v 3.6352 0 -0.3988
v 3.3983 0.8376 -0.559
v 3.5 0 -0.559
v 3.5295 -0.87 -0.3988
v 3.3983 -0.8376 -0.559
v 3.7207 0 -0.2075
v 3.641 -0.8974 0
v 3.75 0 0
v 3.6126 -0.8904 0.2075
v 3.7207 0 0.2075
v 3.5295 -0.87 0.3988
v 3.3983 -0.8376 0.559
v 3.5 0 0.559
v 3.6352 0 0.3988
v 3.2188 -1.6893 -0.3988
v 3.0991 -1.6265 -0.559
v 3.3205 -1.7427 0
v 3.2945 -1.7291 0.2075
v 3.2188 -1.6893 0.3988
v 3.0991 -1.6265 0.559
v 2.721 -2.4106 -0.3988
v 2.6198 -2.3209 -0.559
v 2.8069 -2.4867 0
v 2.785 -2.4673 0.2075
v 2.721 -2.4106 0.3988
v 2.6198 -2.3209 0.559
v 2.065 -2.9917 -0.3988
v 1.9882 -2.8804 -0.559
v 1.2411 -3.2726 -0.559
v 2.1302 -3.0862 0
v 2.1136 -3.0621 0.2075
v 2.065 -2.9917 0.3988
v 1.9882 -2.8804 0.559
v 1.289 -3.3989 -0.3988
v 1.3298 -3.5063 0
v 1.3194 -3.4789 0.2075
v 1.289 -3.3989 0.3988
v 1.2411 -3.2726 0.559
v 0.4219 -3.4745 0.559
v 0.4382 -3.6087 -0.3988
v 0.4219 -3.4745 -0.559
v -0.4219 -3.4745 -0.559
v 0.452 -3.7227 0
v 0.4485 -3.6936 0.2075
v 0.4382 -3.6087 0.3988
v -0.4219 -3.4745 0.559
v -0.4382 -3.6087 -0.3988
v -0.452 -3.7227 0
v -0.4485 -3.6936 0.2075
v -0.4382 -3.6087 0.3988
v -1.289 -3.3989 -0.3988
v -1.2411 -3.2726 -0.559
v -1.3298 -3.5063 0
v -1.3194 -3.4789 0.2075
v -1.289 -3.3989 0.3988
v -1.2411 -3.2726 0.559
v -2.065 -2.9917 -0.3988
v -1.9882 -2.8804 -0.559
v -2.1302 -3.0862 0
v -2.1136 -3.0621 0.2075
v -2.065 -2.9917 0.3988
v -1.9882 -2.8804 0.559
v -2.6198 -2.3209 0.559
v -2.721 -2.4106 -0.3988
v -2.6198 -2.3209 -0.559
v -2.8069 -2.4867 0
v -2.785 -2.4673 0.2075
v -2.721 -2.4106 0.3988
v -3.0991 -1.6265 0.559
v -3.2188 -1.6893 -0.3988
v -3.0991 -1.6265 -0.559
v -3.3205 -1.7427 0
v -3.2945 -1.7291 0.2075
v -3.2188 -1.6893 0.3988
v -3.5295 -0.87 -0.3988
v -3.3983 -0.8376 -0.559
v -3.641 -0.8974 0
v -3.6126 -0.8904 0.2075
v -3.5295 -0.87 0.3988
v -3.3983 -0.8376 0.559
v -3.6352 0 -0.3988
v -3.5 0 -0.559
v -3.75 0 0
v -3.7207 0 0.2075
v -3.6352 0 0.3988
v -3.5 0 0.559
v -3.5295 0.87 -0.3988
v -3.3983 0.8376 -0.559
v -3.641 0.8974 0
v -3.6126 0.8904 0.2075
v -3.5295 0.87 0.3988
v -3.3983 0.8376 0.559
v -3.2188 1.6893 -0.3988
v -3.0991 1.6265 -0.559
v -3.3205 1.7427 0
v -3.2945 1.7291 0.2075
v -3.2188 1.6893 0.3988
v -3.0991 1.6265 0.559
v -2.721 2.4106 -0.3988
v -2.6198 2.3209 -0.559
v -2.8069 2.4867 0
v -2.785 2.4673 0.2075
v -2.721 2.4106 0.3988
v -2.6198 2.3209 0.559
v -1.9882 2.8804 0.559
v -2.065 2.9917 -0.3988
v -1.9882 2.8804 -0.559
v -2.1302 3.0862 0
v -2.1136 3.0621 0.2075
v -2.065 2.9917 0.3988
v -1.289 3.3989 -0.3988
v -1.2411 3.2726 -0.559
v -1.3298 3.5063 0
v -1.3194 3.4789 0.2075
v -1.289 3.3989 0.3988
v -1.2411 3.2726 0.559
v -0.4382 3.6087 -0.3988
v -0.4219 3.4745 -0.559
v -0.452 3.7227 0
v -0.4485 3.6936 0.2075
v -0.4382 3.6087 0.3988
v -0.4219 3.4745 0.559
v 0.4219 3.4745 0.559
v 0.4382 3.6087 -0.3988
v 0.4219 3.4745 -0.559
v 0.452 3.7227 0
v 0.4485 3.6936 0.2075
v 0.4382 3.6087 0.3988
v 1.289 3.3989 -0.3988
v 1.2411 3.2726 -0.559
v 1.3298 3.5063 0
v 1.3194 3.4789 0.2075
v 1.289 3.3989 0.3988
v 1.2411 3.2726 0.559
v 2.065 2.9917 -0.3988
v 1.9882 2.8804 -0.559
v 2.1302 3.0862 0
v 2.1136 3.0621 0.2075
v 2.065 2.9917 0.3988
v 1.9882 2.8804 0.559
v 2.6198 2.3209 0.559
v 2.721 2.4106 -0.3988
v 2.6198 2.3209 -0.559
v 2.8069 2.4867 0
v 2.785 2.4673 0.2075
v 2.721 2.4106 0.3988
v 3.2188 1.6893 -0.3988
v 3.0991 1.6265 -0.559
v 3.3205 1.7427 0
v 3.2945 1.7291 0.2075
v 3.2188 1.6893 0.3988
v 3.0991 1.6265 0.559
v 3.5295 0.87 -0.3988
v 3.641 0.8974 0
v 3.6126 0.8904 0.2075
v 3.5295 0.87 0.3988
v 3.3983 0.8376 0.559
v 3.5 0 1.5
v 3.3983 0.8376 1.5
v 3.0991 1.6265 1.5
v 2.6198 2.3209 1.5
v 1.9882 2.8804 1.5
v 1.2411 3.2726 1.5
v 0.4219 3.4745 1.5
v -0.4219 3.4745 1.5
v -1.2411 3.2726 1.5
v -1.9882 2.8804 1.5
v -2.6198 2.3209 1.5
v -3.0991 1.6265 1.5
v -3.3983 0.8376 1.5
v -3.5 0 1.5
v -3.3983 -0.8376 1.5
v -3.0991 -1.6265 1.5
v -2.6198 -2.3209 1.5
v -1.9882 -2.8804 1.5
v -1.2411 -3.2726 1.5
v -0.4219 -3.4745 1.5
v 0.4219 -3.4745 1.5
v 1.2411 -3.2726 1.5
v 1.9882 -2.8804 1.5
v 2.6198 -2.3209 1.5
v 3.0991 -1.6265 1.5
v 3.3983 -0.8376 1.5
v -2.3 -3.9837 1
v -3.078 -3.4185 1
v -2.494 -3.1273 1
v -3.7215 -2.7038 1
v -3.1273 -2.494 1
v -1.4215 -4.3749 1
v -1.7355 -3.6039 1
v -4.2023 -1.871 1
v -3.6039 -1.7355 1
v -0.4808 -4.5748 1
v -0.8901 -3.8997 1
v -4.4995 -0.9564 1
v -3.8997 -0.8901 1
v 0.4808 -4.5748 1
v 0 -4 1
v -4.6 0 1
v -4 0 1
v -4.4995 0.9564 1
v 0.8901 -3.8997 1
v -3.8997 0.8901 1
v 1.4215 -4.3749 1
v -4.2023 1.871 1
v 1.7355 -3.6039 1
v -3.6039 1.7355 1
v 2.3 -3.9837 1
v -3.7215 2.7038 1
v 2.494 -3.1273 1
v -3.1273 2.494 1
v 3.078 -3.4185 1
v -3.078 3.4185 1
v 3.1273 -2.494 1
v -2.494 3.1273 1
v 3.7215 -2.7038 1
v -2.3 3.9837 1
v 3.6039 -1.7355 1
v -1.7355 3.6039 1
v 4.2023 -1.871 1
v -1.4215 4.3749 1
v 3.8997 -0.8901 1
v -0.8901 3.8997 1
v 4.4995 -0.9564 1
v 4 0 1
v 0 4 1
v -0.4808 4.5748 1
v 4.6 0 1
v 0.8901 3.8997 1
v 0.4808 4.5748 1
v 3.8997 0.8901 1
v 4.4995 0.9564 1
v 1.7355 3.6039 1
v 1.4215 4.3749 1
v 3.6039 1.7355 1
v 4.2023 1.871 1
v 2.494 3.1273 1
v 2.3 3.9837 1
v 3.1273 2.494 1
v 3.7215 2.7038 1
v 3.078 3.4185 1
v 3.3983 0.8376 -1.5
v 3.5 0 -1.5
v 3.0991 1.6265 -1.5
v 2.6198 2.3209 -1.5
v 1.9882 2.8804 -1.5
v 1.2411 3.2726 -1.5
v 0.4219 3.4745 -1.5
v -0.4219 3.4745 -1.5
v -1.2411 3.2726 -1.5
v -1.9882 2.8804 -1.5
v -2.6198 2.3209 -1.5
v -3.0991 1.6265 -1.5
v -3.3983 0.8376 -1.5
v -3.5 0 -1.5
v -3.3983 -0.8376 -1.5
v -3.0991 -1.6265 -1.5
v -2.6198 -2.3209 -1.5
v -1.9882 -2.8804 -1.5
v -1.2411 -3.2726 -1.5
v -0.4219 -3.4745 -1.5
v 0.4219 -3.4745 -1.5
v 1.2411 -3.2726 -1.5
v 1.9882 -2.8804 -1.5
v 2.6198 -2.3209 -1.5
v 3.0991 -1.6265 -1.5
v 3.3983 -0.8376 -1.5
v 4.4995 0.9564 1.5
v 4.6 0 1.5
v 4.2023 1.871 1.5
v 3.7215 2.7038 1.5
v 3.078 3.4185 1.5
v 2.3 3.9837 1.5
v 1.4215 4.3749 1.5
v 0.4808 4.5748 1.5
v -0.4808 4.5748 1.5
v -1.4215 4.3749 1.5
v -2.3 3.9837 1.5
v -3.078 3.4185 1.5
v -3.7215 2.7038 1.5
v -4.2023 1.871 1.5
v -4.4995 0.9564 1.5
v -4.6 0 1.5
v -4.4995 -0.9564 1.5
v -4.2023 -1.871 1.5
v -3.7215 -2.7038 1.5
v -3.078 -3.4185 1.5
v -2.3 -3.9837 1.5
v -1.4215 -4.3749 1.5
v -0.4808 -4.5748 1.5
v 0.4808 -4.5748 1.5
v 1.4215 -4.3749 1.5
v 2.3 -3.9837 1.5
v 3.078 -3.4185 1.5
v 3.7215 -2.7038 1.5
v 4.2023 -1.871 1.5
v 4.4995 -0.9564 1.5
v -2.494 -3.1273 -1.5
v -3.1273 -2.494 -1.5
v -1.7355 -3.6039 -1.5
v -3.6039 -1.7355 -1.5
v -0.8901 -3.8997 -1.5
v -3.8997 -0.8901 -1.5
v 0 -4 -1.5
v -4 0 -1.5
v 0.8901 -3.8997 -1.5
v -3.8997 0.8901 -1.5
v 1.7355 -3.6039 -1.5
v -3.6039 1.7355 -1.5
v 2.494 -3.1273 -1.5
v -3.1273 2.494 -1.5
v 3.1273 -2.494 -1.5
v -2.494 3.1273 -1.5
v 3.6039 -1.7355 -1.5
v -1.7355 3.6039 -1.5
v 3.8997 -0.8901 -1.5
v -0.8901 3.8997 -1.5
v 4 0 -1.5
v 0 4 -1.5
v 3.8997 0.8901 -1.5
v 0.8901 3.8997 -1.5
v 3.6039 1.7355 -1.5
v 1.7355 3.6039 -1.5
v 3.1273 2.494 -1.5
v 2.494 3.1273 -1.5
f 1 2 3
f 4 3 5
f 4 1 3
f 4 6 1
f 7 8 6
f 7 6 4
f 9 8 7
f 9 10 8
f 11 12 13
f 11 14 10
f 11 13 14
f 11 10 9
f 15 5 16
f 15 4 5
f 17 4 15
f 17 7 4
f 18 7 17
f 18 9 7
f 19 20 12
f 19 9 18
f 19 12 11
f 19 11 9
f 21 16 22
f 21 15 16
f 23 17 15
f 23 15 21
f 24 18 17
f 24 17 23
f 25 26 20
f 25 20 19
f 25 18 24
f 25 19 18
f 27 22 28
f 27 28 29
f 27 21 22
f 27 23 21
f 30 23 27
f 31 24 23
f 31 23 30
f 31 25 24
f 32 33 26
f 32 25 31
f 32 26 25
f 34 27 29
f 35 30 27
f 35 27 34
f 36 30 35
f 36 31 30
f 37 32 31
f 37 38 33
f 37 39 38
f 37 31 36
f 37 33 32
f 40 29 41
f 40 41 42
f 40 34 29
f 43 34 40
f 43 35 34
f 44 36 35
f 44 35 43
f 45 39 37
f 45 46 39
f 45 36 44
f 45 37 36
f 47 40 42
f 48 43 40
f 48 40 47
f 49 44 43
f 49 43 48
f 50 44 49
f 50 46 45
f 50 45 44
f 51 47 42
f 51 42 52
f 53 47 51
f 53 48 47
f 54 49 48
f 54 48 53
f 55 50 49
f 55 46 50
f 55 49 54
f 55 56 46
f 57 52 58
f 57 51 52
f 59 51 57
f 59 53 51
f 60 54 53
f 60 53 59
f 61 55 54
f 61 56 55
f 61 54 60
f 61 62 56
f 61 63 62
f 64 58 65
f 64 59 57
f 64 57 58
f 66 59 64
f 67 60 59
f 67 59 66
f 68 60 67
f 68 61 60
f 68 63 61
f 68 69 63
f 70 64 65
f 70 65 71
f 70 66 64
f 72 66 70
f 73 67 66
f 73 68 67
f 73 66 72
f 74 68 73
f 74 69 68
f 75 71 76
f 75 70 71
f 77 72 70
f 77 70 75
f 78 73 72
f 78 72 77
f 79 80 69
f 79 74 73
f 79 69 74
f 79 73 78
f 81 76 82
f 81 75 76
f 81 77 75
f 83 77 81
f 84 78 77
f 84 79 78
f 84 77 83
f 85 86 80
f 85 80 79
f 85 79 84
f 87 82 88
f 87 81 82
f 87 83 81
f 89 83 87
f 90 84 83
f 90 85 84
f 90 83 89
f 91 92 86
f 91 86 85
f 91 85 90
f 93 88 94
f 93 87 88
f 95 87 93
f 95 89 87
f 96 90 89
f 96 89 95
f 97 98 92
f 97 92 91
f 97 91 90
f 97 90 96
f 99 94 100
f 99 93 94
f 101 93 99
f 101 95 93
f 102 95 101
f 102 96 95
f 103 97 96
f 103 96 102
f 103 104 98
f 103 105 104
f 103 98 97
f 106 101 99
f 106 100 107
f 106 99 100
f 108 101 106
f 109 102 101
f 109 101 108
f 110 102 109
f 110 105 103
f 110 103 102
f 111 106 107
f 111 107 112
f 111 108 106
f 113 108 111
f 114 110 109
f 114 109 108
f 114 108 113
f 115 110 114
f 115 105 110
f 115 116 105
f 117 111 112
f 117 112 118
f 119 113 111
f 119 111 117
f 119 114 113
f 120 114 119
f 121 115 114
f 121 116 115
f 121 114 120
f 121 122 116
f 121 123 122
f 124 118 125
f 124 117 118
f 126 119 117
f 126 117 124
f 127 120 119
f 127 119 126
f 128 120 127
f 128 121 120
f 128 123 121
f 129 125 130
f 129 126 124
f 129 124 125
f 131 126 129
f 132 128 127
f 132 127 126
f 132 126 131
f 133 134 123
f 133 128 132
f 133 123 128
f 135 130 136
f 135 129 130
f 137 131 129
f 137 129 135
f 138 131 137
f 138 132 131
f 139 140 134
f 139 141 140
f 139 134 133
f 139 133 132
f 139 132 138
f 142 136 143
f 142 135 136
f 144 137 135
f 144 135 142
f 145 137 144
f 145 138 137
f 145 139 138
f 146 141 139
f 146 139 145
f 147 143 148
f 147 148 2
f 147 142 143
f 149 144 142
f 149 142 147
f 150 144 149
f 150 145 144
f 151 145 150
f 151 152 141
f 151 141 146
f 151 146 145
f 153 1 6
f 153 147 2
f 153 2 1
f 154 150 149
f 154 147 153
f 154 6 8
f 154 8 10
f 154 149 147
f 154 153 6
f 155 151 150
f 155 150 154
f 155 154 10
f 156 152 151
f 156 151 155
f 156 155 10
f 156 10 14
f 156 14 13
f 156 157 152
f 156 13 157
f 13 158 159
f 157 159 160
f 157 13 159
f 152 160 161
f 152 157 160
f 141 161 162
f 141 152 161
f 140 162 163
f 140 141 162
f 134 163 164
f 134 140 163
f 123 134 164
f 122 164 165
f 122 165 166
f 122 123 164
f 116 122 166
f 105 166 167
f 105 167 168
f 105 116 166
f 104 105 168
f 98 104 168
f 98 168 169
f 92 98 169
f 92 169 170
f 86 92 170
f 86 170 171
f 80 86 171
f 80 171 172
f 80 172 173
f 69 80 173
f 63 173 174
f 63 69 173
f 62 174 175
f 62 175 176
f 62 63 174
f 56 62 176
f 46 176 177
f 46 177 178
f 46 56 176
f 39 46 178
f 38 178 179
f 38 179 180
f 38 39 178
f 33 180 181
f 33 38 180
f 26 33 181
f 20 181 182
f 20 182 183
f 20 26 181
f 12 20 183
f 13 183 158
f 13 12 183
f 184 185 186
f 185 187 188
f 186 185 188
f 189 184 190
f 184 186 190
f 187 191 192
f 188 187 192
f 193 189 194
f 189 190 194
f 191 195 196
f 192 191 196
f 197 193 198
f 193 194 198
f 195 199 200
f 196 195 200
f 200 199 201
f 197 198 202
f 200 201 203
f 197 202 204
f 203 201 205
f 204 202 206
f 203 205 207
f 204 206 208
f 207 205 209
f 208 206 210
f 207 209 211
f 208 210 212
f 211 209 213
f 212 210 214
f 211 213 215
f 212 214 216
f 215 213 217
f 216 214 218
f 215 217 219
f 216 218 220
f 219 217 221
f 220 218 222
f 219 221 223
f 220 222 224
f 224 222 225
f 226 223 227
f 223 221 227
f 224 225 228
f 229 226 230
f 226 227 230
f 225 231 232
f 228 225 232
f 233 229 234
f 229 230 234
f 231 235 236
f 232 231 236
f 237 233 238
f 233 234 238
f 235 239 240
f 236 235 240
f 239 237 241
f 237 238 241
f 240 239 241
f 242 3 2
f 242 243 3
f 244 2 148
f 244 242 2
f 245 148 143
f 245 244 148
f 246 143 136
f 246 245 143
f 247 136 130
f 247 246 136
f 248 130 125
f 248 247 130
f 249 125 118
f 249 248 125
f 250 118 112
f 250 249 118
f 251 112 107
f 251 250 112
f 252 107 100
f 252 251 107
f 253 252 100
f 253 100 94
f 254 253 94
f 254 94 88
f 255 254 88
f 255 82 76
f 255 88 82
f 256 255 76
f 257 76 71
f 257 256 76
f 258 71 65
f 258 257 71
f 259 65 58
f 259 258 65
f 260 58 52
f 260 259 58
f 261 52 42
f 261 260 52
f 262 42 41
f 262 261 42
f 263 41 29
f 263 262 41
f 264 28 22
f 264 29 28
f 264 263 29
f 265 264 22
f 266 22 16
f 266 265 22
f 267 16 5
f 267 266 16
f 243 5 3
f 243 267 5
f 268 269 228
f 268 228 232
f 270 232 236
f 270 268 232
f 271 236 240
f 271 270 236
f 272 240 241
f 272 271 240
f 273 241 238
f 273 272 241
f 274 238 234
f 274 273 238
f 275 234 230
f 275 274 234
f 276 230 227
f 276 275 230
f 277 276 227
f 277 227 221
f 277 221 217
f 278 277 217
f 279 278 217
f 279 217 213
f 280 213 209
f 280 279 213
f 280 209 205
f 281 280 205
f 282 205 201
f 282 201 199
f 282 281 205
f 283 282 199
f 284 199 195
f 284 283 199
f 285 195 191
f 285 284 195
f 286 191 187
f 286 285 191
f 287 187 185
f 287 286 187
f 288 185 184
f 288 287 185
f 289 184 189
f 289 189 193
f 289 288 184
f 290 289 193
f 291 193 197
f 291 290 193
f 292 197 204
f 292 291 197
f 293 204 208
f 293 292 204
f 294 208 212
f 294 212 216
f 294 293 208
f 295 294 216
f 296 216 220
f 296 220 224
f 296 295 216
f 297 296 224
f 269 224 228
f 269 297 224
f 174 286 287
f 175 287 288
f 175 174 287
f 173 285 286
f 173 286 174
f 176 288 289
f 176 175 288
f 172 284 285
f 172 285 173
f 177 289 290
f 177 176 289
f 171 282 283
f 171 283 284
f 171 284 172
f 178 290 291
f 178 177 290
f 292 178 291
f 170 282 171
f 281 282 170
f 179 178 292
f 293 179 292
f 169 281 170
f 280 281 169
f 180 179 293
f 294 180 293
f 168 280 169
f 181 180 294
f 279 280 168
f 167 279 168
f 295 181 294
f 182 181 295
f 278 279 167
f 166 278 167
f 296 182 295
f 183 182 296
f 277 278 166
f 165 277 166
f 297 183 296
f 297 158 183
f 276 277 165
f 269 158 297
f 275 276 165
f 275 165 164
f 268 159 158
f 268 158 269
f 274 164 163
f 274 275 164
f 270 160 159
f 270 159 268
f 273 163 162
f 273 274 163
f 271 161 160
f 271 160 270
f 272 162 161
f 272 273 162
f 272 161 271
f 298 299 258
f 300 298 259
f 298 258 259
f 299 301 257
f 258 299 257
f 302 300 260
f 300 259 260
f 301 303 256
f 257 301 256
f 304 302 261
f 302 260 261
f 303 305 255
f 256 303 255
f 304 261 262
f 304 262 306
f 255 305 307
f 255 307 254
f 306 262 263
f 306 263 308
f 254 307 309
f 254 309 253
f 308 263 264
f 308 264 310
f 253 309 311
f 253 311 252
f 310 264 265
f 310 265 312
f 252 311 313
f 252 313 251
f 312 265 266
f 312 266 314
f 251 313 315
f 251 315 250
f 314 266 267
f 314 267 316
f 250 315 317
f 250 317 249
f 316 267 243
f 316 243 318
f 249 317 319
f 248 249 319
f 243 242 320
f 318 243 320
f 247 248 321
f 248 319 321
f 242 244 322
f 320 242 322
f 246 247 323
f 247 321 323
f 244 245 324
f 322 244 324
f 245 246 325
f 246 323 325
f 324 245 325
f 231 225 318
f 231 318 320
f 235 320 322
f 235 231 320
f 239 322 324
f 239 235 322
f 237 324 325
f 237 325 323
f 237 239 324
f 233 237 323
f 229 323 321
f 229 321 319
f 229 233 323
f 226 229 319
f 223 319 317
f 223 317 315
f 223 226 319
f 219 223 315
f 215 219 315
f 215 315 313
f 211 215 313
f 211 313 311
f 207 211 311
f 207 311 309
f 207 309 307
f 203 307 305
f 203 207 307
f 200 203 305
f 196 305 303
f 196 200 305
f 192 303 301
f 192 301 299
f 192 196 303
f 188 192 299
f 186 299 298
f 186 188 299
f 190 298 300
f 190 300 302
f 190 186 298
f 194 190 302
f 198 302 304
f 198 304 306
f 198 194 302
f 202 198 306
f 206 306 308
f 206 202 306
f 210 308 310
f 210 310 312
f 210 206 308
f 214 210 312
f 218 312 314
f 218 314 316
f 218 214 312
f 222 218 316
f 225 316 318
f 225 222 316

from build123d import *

# Parameters (mm, degrees)
ESQUISSE1_R        = 4
ESQUISSE1_R_2      = 3.5
BOSS_EXTRU_1_DEPTH = 1.5
ESQUISSE2_R        = 4.6
ESQUISSE2_R_2      = 4
BOSS_EXTRU_2_DEPTH = 0.5


with BuildPart() as part:
    # Esquisse1 → Boss.-Extru.1 (new, symmetric)
    with BuildSketch(Plane.XY):
        Circle(ESQUISSE1_R)
        Circle(ESQUISSE1_R_2, mode=Mode.SUBTRACT)
    extrude(amount=BOSS_EXTRU_1_DEPTH, both=True)

    # Esquisse2 → Boss.-Extru.2 (add)
    with BuildSketch(Plane.XY.offset(1.5)):
        Circle(ESQUISSE2_R)
        Circle(ESQUISSE2_R_2, mode=Mode.SUBTRACT)
    extrude(amount=-BOSS_EXTRU_2_DEPTH)

    # Esquisse3 → Enlèvement de matière-Révolution1 (revolve, cut)
    with BuildSketch(Plane(origin=(0, 0, 0), x_dir=(1, 0, 0), z_dir=(0, 1, 0)), mode=Mode.PRIVATE) as enl_vement_de_mati_re_r_volution1_sk:
        with BuildLine():
            Line((-3.5, -0.559016994), (-3.5, 0.559016994))
            ThreePointArc((-3.5, 0.559016994), (-3.75, 0), (-3.5, -0.559016994))
        make_face()
    revolve(enl_vement_de_mati_re_r_volution1_sk.sketch.rotate(Axis((0, 0, 1.5), (0, 0, -1)), 180), axis=Axis((0, 0, 1.5), (0, 0, -1)), mode=Mode.SUBTRACT)


solid = part.part
